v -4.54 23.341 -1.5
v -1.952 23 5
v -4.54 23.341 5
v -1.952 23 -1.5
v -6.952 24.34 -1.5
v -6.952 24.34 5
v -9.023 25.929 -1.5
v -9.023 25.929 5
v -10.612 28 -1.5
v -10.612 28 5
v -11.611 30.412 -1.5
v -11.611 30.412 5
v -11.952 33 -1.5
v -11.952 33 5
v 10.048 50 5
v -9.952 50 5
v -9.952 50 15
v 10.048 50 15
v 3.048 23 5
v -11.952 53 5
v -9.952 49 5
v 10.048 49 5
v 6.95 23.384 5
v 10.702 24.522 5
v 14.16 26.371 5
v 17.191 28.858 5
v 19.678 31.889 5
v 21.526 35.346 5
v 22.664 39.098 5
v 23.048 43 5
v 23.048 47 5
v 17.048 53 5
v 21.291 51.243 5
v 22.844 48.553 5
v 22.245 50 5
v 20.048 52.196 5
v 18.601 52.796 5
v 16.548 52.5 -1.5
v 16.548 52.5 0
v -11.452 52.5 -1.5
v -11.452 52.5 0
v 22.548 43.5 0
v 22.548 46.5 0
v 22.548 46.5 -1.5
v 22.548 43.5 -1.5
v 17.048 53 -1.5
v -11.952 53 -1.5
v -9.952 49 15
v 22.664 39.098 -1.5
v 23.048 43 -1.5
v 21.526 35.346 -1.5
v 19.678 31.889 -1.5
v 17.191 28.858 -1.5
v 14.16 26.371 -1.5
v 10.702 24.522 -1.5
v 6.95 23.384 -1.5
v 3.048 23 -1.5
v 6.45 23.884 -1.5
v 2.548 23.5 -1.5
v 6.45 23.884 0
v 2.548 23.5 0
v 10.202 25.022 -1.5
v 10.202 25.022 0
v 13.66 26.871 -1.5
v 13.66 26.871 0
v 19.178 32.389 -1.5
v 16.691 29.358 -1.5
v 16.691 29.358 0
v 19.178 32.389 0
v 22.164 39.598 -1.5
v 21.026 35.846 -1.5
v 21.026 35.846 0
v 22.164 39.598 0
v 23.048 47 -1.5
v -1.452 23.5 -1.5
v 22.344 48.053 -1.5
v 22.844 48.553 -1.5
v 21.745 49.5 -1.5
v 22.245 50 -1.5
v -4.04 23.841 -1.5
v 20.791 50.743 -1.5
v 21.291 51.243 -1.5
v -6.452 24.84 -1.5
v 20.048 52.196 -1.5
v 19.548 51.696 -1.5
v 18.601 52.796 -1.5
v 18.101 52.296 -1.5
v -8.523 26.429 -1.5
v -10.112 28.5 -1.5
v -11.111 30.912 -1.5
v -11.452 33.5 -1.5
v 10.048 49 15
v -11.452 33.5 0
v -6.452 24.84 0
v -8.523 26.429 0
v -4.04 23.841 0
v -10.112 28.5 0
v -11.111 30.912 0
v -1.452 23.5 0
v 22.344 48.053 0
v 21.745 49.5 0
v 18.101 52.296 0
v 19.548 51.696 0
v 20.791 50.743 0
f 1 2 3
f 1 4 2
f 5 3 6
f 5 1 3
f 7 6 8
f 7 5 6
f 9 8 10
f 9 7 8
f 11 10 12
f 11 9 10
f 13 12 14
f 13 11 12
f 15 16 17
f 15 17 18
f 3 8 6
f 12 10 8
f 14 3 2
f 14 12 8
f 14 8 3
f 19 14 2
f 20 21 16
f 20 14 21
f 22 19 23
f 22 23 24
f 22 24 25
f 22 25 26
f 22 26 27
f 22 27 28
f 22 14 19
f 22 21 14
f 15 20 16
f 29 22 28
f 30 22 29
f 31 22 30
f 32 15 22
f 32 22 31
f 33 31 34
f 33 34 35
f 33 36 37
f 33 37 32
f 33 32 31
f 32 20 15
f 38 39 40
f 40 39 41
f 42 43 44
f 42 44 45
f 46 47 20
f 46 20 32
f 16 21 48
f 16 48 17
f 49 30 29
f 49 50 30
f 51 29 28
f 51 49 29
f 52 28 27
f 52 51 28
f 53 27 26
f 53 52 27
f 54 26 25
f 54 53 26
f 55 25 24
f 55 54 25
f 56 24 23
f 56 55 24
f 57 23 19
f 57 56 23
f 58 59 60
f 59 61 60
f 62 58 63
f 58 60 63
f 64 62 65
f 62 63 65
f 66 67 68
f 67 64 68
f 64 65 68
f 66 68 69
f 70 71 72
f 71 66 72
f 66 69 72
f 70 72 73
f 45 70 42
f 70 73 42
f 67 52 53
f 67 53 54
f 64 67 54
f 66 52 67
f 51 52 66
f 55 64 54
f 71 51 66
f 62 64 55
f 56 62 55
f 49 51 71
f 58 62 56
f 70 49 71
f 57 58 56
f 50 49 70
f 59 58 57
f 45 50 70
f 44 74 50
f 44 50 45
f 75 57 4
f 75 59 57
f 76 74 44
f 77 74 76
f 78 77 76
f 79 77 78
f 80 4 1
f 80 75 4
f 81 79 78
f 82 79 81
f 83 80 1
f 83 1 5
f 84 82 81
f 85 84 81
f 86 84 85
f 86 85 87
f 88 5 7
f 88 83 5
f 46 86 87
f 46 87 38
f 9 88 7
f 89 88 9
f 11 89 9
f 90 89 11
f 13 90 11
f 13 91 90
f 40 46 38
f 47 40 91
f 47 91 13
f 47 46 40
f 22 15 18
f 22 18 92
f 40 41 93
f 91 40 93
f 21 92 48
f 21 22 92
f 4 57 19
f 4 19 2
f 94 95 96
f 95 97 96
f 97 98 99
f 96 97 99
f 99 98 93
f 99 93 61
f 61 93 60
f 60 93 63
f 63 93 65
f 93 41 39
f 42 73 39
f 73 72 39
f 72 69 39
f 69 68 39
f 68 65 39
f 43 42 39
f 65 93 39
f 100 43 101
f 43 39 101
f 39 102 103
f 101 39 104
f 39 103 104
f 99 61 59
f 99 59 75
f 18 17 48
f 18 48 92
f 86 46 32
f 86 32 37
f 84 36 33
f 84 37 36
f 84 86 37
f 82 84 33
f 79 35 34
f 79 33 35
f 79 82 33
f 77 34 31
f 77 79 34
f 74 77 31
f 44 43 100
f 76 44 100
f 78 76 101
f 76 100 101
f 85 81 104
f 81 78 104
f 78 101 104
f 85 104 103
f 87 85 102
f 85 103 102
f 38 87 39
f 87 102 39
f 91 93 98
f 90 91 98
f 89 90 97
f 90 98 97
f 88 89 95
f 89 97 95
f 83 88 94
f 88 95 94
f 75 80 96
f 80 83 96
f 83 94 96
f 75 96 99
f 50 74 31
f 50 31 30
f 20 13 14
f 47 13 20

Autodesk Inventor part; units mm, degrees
ref_plane "YZ Plane" through (0, 0, 0) normal (1, 0, 0) x (0, 1, 0)
ref_plane "XZ Plane" through (0, 0, 0) normal (0, 1, 0) x (-1, 0, 0)
ref_plane "XY Plane" through (0, 0, 0) normal (0, 0, 1) x (1, 0, 0)
sketch "Sketch1" plane through (0, 0, 0) normal (0, 0, 1) x (1, 0, 0)
  line L0 (-11.9516, 53) -> (17.0484, 53)
  line L1 (23.0484, 47) -> (23.0484, 43)
  line L2 (3.0484, 23) -> (-1.9516, 23)
  line L3 (-11.9516, 33) -> (-11.9516, 53)
  arc A0 (23.0484, 47) -> (17.0484, 53) centre (17.0484, 47) ccw
  arc A1 (3.0484, 23) -> (23.0484, 43) centre (3.0484, 43) ccw
  arc A2 (-11.9516, 33) -> (-1.9516, 23) centre (-1.9516, 33) ccw
  point P0 (0, 0)
  point P1 (23.0484, 23)
  point P2 (-11.9516, 23)
  dimension "d0" = 6
  dimension "d1" = 30
  dimension "d2" = 35
  dimension "d3" = 20
  dimension "d4" = 10
extrude "Extrusion1" add sketch "Sketch1" along normal blind 5
sketch "Sketch3" plane through (0, 0, 0) normal (0, 0, -1) x (-1, 0, 0)
  line L0 (-17.0484, 53) -> (11.9516, 53) projected
  line L1 (11.9516, 53) -> (11.9516, 33) projected
  line L2 (11.9516, 53) -> (11.9516, 33)
  arc A0 (1.9516, 23) -> (11.9516, 33) centre (1.9516, 33) ccw projected
  line L3 (1.9516, 23) -> (-3.0484, 23) projected
  line L4 (1.9516, 23) -> (-3.0484, 23)
  line L5 (-23.0484, 43) -> (-23.0484, 47) projected
  line L6 (-23.0484, 43) -> (-23.0484, 47)
  arc A1 (-17.0484, 53) -> (-23.0484, 47) centre (-17.0484, 47) ccw projected
  line L7 (-17.0484, 53) -> (11.9516, 53)
  arc A2 (1.9516, 23) -> (11.9516, 33) centre (1.9516, 33) ccw
  arc A3 (-23.0484, 43) -> (-3.0484, 23) centre (-3.0484, 43) ccw
  arc A4 (-17.0484, 53) -> (-23.0484, 47) centre (-17.0484, 47) ccw
  line L8 (11.4516, 52.5) -> (11.4516, 33.5)
  line L9 (-2.5484, 23.5) -> (1.4516, 23.5)
  line L10 (-22.5484, 46.5) -> (-22.5484, 43.5)
  line L11 (-16.5484, 52.5) -> (11.4516, 52.5)
  arc A5 (-16.5484, 52.5) -> (-22.5484, 46.5) centre (-16.5484, 46.5) ccw
  arc A6 (1.4516, 23.5) -> (11.4516, 33.5) centre (1.4516, 33.5) ccw
  arc A7 (-22.5484, 43.5) -> (-2.5484, 23.5) centre (-2.5484, 43.5) ccw
  point P0 (0, 0)
  dimension "d14" = 10
  dimension "d15" = 20
  dimension "d16" = 6
  dimension "d17" = 0.5
  dimension "d18" = 0.5
  dimension "d19" = 0.5
  dimension "d20" = 0.5
  dimension "d21" = 6
  dimension "d22" = 10
  dimension "d23" = 20
extrude "Extrusion2" add sketch "Sketch3" along normal blind 1.5
sketch "Sketch4" plane through (0, 0, 5) normal (0, 0, 1) x (1, 0, 0)
  line L0 (-1.9516, 23) -> (3.0484, 23) projected
  arc A0 (3.0484, 23) -> (23.0484, 43) centre (3.0484, 43) ccw projected
  line L1 (23.0484, 43) -> (23.0484, 47) projected
  arc A1 (23.0484, 47) -> (17.0484, 53) centre (17.0484, 47) ccw projected
  line L2 (17.0484, 53) -> (-11.9516, 53) projected
  line L3 (-11.9516, 53) -> (-11.9516, 33) projected
  arc A2 (-11.9516, 33) -> (-1.9516, 23) centre (-1.9516, 33) ccw projected
  line L4 (-9.9516, 50) -> (10.0484, 50)
  line L5 (10.0484, 50) -> (10.0484, 49)
  line L6 (10.0484, 49) -> (-9.9516, 49)
  line L7 (-9.9516, 49) -> (-9.9516, 50)
  point P0 (0, 0)
  dimension "d26" = 1
  dimension "d27" = 3
  dimension "d28" = 2
  dimension "d29" = 20
extrude "Extrusion3" add sketch "Sketch4" along normal blind 10 contours L4 L5 L6 L7
properties part number "McCrea_oko_walle"
